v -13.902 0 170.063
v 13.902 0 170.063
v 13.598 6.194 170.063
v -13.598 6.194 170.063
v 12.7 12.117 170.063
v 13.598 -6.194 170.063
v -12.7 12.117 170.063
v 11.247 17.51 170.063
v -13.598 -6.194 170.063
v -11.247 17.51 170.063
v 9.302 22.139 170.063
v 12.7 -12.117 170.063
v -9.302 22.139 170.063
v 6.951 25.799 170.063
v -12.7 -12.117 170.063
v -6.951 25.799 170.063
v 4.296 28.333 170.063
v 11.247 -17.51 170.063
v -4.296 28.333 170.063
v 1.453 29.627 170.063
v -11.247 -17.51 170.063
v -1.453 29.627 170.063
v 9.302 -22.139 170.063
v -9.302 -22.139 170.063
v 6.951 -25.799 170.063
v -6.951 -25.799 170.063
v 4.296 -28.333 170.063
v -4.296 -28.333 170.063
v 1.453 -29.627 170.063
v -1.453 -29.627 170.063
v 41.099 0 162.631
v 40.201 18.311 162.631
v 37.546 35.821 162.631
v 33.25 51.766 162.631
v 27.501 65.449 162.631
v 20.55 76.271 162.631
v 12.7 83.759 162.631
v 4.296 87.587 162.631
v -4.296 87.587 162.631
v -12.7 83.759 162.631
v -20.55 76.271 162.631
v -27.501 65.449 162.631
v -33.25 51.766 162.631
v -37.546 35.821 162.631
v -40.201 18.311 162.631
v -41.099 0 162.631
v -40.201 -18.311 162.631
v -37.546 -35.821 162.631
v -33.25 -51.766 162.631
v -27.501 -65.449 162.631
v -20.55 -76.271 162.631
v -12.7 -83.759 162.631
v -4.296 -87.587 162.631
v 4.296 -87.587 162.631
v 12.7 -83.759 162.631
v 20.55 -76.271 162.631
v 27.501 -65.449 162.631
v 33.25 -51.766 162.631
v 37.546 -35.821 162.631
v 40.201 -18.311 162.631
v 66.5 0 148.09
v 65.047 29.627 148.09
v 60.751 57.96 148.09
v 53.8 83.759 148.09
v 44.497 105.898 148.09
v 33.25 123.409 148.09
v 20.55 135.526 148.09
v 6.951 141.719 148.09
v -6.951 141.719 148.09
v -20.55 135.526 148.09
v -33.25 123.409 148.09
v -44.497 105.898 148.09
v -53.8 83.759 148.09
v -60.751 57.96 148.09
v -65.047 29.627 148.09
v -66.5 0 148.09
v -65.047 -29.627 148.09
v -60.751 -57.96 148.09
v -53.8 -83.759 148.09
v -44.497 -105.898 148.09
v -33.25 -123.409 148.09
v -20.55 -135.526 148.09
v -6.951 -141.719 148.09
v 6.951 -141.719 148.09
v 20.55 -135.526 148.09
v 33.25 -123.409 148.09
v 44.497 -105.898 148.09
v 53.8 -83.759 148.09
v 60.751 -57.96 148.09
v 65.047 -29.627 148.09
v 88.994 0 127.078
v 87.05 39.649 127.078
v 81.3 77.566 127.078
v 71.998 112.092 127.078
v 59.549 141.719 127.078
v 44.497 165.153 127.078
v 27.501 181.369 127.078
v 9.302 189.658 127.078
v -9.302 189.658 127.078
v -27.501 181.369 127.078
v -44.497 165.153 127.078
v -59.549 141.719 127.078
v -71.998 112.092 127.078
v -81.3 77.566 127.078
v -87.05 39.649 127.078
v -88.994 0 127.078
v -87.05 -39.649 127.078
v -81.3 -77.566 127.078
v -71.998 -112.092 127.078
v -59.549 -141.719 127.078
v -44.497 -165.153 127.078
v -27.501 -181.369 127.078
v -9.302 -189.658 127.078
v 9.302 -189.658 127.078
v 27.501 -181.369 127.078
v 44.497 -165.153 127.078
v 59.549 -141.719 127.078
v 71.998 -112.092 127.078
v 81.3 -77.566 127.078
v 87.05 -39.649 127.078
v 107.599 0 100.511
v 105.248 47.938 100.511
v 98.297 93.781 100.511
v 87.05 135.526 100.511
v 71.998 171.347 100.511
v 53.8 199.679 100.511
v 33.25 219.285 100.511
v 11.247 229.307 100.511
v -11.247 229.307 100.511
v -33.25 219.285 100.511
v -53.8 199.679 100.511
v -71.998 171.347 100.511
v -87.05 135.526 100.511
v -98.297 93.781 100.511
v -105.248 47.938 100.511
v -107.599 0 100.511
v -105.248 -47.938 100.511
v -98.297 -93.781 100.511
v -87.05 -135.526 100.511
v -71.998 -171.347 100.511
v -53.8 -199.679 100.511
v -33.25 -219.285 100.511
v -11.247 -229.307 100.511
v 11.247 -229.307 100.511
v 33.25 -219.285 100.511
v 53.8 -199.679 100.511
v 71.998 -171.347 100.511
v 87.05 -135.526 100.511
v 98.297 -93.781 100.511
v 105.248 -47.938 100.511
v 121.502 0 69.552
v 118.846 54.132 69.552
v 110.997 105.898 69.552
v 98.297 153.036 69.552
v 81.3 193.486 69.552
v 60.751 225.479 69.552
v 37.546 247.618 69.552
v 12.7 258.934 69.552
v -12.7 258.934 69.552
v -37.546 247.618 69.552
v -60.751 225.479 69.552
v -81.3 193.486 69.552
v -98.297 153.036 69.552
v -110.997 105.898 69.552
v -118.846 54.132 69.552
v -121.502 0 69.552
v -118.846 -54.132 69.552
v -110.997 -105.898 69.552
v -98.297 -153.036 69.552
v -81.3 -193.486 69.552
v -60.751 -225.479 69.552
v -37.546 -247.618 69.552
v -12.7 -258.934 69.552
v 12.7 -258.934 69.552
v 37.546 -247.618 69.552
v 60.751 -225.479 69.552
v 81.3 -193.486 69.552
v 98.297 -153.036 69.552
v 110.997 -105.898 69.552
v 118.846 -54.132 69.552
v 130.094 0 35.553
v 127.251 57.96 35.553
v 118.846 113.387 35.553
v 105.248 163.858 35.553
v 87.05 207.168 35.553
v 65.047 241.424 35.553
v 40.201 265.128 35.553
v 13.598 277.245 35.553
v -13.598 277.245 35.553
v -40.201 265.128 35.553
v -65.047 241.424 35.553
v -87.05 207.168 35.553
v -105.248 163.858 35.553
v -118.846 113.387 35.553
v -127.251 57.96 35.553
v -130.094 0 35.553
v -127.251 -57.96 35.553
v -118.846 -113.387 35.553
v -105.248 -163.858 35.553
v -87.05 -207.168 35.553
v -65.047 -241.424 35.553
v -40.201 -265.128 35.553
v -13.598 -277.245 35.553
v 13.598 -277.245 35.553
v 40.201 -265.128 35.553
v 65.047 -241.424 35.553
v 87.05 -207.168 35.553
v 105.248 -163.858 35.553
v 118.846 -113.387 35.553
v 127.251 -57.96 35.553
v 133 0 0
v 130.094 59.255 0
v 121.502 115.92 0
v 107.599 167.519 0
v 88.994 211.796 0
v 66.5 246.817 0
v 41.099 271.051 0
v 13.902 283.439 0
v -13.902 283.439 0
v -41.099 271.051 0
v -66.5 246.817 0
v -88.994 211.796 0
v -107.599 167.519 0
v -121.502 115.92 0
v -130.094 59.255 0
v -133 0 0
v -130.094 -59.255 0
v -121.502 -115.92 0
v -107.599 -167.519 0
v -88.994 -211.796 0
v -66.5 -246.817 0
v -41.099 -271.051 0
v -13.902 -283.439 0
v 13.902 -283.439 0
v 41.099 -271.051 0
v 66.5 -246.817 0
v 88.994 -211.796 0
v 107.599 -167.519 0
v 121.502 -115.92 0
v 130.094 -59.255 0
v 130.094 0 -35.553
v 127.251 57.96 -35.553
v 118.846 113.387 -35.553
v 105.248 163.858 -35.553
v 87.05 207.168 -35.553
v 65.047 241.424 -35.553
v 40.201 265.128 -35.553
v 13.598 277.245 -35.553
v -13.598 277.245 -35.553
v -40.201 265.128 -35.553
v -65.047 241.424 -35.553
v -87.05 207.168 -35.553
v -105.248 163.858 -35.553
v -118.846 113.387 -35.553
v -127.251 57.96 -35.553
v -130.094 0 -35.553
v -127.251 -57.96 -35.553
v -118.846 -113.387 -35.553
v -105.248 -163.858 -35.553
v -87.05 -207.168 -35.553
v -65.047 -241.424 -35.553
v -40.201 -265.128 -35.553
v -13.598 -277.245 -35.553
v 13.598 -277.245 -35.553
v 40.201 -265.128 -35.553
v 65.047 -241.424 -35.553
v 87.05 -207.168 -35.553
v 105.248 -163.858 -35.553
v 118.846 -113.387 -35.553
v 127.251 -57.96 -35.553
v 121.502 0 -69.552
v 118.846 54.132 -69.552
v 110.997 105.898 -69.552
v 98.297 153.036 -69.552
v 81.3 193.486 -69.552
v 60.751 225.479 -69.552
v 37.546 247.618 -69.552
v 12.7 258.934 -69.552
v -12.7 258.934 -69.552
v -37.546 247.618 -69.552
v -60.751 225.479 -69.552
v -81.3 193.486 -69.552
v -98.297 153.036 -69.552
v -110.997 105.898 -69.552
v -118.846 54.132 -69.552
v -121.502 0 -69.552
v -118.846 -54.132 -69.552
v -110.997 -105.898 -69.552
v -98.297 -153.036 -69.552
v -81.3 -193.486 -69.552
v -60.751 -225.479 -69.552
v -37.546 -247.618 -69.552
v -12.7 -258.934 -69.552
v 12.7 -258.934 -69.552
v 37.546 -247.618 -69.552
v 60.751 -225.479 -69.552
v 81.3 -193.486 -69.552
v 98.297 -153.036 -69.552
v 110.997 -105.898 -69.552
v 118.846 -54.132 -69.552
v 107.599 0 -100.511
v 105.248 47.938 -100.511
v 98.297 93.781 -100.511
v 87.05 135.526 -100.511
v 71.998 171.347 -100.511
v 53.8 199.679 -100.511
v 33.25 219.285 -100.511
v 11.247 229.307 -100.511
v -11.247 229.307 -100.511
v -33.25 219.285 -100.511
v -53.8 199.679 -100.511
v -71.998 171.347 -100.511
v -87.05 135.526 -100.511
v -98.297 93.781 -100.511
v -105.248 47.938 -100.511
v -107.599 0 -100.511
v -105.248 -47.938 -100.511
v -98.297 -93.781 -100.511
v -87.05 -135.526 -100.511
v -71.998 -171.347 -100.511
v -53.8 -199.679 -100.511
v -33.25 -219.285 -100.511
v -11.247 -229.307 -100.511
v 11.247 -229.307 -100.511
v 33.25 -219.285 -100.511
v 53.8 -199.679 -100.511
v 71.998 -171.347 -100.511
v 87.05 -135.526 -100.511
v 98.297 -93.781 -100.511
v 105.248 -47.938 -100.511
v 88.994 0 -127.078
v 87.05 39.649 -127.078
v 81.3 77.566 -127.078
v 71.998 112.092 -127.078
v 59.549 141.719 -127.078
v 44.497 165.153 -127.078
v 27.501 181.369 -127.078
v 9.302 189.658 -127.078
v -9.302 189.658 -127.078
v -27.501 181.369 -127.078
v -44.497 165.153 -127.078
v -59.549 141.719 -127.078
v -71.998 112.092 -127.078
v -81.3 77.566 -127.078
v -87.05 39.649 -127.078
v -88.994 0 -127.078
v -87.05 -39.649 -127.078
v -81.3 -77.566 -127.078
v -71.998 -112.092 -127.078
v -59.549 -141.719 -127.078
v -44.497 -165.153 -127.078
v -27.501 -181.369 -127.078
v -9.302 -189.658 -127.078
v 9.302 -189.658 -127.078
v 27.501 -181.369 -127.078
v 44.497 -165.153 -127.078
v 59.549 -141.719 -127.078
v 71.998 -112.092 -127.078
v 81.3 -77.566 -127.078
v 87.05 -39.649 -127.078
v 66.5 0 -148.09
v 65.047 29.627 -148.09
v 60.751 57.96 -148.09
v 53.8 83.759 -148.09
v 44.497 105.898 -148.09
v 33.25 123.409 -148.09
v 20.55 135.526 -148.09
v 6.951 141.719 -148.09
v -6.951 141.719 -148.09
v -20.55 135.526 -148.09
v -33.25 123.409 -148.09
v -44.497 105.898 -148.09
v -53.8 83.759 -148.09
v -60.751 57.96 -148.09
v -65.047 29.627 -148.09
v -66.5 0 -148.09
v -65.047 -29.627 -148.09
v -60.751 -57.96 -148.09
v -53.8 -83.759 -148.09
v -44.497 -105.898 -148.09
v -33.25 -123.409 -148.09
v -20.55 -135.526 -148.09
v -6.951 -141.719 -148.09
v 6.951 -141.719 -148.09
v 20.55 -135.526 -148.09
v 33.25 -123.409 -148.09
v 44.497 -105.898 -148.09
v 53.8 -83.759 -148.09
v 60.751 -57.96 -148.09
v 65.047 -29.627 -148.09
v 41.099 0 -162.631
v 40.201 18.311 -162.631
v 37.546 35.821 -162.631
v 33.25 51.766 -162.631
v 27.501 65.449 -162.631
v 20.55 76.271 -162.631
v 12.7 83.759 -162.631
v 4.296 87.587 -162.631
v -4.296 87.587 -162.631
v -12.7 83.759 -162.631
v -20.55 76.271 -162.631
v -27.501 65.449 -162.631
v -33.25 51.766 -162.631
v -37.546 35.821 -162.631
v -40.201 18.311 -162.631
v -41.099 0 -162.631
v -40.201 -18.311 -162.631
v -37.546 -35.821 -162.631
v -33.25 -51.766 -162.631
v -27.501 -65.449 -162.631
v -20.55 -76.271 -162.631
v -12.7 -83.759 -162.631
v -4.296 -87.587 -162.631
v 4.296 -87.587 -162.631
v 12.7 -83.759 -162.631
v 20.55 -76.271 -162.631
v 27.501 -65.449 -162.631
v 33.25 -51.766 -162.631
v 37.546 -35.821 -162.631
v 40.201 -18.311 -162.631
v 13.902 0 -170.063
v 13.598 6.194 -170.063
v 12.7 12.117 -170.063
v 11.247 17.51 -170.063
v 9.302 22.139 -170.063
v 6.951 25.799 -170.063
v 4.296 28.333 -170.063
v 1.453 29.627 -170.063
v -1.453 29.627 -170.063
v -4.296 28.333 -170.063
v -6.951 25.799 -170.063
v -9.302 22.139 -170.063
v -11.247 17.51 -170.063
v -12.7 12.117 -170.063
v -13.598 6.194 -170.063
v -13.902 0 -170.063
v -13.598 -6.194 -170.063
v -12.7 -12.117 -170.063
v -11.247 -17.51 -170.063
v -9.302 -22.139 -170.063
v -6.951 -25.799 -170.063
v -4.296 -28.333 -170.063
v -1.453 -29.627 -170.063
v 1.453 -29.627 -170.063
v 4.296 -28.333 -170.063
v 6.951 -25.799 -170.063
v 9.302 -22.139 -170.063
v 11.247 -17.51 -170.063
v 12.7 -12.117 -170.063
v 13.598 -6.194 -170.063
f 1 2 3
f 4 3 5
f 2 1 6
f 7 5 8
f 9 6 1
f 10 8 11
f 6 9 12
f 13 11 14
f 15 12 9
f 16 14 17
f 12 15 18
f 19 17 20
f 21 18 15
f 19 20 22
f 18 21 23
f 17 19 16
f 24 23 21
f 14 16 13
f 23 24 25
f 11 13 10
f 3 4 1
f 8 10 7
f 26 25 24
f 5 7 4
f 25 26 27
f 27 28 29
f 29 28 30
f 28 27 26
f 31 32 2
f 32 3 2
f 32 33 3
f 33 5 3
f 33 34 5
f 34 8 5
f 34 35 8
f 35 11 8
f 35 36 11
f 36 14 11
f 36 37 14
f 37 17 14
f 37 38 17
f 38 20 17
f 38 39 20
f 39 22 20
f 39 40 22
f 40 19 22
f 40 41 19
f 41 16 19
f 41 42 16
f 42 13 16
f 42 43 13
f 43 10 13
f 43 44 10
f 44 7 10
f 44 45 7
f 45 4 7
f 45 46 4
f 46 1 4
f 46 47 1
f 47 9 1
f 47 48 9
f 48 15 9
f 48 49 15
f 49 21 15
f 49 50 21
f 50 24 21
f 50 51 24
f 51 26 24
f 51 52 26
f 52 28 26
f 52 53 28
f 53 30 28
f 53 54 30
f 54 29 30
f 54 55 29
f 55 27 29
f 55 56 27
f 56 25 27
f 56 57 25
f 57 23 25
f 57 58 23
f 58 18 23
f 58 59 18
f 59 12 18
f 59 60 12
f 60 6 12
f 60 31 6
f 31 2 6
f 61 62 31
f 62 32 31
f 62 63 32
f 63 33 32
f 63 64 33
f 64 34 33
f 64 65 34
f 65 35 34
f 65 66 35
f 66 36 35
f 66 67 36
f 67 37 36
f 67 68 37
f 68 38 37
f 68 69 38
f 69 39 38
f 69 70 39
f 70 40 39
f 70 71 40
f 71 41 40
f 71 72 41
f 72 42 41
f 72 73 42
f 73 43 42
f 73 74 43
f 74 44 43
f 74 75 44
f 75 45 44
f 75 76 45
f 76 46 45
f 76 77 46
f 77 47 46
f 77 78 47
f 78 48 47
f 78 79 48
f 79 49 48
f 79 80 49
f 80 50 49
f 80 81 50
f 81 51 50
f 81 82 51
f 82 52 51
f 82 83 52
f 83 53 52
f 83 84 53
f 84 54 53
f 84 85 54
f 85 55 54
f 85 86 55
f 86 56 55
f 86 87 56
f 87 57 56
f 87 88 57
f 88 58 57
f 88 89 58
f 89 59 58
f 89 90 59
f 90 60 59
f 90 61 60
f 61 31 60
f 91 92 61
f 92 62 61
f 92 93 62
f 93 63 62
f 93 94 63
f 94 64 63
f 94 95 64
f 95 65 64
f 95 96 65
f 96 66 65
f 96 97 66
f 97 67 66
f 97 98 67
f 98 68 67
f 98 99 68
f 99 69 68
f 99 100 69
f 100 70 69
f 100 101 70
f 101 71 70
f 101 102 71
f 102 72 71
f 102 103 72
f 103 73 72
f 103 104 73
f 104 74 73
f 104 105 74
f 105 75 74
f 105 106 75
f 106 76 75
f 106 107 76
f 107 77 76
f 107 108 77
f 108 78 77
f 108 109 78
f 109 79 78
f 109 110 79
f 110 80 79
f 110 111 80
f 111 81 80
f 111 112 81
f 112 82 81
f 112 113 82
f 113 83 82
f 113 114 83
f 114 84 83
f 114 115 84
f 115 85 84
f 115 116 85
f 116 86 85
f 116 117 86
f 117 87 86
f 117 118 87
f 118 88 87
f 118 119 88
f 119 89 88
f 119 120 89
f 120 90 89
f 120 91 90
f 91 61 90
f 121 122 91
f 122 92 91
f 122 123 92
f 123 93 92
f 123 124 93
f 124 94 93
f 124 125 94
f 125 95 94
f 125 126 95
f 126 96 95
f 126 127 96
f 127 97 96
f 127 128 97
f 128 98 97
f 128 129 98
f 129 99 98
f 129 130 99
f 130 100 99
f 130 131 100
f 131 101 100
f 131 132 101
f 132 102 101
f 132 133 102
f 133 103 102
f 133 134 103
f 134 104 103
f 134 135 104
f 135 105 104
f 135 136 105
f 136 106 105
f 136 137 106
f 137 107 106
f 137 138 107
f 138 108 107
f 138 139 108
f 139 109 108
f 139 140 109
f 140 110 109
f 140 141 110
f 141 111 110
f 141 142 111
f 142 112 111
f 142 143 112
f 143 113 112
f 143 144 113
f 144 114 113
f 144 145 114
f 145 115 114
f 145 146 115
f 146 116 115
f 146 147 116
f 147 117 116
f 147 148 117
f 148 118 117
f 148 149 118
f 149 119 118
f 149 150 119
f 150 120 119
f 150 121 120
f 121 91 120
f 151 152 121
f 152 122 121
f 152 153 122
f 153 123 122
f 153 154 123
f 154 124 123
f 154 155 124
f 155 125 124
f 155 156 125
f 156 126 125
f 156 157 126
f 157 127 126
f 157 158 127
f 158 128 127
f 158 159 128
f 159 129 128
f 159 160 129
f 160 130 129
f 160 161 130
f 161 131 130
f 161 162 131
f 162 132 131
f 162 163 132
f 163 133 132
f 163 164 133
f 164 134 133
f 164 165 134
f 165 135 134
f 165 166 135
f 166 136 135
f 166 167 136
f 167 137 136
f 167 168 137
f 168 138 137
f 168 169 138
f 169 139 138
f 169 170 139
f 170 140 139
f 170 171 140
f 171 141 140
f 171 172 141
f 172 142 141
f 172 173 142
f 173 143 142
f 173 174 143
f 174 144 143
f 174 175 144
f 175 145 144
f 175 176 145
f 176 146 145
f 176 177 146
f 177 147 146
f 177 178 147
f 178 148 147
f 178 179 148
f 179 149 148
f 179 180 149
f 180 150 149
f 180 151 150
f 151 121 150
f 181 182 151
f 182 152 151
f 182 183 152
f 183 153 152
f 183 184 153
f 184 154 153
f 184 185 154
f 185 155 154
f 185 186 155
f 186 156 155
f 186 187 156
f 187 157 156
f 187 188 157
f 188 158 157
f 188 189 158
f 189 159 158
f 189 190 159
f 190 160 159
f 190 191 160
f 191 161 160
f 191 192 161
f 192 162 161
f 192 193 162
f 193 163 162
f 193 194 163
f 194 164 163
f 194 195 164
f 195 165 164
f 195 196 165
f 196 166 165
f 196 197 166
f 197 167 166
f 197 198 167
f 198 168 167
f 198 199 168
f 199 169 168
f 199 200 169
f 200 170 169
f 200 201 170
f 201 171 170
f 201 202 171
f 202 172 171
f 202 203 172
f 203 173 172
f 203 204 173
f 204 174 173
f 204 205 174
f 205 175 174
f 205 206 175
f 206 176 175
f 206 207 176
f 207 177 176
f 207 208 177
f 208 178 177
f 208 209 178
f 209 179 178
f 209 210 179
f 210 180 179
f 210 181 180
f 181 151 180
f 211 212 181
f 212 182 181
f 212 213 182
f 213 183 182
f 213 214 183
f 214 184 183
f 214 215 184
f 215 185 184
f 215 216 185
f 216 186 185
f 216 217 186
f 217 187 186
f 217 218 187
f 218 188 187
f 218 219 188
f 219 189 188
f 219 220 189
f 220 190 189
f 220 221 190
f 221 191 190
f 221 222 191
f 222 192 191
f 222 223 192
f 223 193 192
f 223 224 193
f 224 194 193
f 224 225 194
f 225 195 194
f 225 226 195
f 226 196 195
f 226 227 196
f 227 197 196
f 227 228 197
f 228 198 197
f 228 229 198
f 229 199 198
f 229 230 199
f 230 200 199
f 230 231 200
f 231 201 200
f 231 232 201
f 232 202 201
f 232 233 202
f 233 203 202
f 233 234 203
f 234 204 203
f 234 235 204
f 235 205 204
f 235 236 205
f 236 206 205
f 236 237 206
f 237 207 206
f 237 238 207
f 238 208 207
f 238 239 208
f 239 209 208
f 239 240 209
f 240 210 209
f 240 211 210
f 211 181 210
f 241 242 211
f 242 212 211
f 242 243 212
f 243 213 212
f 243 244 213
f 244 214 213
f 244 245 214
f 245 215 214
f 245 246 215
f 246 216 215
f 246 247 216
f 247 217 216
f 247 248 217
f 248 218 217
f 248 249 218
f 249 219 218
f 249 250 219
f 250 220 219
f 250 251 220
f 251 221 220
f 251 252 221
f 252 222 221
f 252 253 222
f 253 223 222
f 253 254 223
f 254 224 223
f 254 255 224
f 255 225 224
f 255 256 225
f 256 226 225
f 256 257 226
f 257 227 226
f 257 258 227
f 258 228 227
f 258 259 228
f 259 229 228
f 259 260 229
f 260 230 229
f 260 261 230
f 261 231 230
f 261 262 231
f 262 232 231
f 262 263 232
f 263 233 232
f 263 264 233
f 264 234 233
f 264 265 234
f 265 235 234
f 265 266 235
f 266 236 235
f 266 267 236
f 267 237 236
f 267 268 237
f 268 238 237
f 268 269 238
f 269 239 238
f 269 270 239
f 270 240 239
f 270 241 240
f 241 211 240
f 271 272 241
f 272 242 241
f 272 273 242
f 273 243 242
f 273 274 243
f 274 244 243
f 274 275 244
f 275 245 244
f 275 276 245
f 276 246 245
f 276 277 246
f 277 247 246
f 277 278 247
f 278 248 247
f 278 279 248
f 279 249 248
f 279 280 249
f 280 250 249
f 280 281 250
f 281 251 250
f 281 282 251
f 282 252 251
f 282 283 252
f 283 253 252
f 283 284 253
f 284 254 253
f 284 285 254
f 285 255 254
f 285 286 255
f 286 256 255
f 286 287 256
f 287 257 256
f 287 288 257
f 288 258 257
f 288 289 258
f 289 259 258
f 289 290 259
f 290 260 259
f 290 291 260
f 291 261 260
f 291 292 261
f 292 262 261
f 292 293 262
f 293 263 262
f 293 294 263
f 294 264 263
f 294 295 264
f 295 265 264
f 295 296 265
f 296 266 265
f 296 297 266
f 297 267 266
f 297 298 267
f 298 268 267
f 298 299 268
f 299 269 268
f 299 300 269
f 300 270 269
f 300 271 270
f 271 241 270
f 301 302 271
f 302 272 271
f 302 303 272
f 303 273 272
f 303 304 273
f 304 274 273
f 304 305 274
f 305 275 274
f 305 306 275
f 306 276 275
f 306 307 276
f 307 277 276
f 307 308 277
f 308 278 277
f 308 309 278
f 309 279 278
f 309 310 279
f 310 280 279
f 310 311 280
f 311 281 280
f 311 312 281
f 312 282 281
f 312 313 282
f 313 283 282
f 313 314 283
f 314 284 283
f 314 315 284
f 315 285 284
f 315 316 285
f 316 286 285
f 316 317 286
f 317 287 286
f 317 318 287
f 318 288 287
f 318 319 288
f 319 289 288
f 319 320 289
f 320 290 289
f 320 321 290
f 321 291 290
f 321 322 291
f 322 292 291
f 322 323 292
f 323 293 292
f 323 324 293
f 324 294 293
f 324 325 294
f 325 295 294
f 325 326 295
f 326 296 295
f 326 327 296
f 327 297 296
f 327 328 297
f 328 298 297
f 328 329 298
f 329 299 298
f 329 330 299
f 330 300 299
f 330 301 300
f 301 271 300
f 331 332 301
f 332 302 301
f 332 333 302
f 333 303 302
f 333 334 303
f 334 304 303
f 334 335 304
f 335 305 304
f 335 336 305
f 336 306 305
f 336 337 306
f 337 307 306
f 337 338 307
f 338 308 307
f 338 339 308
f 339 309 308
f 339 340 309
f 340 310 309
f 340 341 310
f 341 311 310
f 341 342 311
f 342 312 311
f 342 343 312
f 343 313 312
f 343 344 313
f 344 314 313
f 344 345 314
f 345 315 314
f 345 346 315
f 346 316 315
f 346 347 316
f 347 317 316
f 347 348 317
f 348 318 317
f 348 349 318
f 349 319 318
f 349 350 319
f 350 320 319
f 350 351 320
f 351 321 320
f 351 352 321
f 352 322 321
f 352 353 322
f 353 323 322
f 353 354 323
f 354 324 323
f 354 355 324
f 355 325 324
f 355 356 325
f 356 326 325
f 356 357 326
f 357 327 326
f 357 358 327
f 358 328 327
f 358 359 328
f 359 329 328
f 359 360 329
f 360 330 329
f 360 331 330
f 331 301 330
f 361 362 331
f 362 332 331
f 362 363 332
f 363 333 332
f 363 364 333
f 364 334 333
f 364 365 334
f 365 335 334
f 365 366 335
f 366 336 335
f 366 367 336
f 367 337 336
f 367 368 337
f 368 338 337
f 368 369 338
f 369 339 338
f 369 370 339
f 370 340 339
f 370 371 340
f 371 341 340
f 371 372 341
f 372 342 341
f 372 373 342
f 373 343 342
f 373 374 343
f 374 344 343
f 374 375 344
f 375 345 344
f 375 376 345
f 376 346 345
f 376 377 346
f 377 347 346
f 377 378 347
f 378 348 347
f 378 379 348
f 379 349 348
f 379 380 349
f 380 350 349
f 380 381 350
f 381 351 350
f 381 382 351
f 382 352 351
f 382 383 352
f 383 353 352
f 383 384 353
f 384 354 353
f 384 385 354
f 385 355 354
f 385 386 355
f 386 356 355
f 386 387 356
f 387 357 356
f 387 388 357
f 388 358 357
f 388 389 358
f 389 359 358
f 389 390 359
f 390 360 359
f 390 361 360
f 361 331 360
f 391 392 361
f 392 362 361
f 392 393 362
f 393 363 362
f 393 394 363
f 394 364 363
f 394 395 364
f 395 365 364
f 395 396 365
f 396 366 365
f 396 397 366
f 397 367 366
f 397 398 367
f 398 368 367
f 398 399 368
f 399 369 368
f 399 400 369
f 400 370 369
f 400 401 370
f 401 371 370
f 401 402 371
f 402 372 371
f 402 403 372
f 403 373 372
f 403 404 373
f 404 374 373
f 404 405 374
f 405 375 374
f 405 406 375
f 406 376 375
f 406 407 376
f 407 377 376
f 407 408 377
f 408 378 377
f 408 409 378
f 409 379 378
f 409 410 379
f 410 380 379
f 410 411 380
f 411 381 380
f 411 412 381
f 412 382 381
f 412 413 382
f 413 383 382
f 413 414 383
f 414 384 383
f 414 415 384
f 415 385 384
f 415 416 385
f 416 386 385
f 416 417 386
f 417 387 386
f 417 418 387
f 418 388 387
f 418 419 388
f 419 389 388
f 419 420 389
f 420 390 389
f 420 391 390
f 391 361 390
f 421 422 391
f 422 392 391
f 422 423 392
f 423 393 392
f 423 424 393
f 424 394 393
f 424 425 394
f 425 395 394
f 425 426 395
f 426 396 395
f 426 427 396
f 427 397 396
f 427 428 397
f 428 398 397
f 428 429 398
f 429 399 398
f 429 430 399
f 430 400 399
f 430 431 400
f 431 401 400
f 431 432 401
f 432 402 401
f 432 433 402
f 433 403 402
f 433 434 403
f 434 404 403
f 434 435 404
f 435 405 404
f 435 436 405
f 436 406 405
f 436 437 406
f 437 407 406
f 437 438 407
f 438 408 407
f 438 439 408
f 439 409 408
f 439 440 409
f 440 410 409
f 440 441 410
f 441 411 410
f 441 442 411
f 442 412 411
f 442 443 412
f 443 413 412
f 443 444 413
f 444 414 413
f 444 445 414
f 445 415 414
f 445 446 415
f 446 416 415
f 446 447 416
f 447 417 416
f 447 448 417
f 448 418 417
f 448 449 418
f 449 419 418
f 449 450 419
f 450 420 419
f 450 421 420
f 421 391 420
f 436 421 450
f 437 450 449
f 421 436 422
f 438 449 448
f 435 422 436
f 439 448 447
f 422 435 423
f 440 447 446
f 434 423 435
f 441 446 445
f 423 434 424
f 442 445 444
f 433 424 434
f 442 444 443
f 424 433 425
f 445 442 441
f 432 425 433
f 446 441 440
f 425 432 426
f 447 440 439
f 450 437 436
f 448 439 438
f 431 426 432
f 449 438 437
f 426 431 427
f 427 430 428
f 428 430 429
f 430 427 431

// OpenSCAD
// Generated by SolidPython 1.0.1 on 2020-07-29 00:46:48


scale(v = [7, 15, 9]) {
	sphere(r = 19);
}
/***********************************************
*********      SolidPython code:      **********
************************************************
 
# import packages: SolidPython
from solid import *
from solid.utils import *
from itertools import chain, combinations, permutations


class Resize:

    def __init__(self, scad_file):
        self.scad_file = scad_file
        #self.scad_file = import_scad(scad_file)
        # cone/cylinder param:
        self.r1 = 0
        self.r2 = 0
        self.h = 0
        # rectangular prism param:
        self.w = 0
        self.l = 0
        # ellipse param:
        self.r = 0

    # import OpenScad code (file name corresponds to shape)


    # classify shape + parameters
    def assign(self, param1, param2, param3):
        if self.scad_file == 'cone.scad':
            self.r1 = param1
            self.r2 = param2
            self.h = param3
        elif self.scad_file == 'cylinder.scad':
            self.r1 = param1
            self.r2 = param2
            self.h = param3
        elif self.scad_file == 'rectangularPrism.scad':
            self.h = param1
            self.l = param2
            self.w = param3
        else:
            self.r = param1
            self.h = param2

    # resize parameters
    def iterate(self):
        x = range(3, 20, 2)
        i = 1
        if self.scad_file == 'cone.scad':
            tempList = list(permutations(x, 2))
            for temp in tempList:
                param1 = temp[0]
                param2 = temp[1]
                filepath = 'produced_scad_files/' + 'cone' + str(param1) + '_' + str(param2) + '_' + '.scad'
                scad_render_to_file(cylinder(h=param1, r1=param2, r2=0), filepath)

        elif self.scad_file == 'cylinder.scad':
            tempList = list(permutations(x, 3))
            for temp in tempList:
                param1 = temp[0]
                param2 = temp[1]
                filepath = 'produced_scad_files/' + 'cylinder' + str(param1) + '_' + str(param2) + '_' + '.scad'
                scad_render_to_file(cylinder(h=param1, r1=param2, r2=param2), filepath)

        elif self.scad_file == 'rectangularPrism.scad':
            tempList = list(permutations(x, 3))
            for temp in tempList:
                param1 = temp[0]
                param2 = temp[1]
                param3 = temp[2]
                filepath = 'produced_scad_files/' + 'rectangularPrism' + str(param1) + '_' + str(param2) + '_' + str(
                    param3) + '.scad'
                scad_render_to_file(cube(size=(param1, param2, param3)), filepath)

        elif self.scad_file == 'ellipse.scad':
            tempList = list(permutations(x, 4))
            for temp in tempList:
                param1 = temp[0]
                param2 = temp[1]
                param3 = temp[2]
                param4 = temp[3]
                filepath = 'produced_scad_files/' + 'ellipse' + str(param1) + '_' + str(param2) + '_' + str(param3) + '_' + str(param4) + '.scad'
                scad_render_to_file(scale([param1, param2, param3])(sphere(r=param4)), filepath)

    def render_to_scadfile(self):
        scad_render_to_file(scad, 'example.scad') 
 
************************************************/
